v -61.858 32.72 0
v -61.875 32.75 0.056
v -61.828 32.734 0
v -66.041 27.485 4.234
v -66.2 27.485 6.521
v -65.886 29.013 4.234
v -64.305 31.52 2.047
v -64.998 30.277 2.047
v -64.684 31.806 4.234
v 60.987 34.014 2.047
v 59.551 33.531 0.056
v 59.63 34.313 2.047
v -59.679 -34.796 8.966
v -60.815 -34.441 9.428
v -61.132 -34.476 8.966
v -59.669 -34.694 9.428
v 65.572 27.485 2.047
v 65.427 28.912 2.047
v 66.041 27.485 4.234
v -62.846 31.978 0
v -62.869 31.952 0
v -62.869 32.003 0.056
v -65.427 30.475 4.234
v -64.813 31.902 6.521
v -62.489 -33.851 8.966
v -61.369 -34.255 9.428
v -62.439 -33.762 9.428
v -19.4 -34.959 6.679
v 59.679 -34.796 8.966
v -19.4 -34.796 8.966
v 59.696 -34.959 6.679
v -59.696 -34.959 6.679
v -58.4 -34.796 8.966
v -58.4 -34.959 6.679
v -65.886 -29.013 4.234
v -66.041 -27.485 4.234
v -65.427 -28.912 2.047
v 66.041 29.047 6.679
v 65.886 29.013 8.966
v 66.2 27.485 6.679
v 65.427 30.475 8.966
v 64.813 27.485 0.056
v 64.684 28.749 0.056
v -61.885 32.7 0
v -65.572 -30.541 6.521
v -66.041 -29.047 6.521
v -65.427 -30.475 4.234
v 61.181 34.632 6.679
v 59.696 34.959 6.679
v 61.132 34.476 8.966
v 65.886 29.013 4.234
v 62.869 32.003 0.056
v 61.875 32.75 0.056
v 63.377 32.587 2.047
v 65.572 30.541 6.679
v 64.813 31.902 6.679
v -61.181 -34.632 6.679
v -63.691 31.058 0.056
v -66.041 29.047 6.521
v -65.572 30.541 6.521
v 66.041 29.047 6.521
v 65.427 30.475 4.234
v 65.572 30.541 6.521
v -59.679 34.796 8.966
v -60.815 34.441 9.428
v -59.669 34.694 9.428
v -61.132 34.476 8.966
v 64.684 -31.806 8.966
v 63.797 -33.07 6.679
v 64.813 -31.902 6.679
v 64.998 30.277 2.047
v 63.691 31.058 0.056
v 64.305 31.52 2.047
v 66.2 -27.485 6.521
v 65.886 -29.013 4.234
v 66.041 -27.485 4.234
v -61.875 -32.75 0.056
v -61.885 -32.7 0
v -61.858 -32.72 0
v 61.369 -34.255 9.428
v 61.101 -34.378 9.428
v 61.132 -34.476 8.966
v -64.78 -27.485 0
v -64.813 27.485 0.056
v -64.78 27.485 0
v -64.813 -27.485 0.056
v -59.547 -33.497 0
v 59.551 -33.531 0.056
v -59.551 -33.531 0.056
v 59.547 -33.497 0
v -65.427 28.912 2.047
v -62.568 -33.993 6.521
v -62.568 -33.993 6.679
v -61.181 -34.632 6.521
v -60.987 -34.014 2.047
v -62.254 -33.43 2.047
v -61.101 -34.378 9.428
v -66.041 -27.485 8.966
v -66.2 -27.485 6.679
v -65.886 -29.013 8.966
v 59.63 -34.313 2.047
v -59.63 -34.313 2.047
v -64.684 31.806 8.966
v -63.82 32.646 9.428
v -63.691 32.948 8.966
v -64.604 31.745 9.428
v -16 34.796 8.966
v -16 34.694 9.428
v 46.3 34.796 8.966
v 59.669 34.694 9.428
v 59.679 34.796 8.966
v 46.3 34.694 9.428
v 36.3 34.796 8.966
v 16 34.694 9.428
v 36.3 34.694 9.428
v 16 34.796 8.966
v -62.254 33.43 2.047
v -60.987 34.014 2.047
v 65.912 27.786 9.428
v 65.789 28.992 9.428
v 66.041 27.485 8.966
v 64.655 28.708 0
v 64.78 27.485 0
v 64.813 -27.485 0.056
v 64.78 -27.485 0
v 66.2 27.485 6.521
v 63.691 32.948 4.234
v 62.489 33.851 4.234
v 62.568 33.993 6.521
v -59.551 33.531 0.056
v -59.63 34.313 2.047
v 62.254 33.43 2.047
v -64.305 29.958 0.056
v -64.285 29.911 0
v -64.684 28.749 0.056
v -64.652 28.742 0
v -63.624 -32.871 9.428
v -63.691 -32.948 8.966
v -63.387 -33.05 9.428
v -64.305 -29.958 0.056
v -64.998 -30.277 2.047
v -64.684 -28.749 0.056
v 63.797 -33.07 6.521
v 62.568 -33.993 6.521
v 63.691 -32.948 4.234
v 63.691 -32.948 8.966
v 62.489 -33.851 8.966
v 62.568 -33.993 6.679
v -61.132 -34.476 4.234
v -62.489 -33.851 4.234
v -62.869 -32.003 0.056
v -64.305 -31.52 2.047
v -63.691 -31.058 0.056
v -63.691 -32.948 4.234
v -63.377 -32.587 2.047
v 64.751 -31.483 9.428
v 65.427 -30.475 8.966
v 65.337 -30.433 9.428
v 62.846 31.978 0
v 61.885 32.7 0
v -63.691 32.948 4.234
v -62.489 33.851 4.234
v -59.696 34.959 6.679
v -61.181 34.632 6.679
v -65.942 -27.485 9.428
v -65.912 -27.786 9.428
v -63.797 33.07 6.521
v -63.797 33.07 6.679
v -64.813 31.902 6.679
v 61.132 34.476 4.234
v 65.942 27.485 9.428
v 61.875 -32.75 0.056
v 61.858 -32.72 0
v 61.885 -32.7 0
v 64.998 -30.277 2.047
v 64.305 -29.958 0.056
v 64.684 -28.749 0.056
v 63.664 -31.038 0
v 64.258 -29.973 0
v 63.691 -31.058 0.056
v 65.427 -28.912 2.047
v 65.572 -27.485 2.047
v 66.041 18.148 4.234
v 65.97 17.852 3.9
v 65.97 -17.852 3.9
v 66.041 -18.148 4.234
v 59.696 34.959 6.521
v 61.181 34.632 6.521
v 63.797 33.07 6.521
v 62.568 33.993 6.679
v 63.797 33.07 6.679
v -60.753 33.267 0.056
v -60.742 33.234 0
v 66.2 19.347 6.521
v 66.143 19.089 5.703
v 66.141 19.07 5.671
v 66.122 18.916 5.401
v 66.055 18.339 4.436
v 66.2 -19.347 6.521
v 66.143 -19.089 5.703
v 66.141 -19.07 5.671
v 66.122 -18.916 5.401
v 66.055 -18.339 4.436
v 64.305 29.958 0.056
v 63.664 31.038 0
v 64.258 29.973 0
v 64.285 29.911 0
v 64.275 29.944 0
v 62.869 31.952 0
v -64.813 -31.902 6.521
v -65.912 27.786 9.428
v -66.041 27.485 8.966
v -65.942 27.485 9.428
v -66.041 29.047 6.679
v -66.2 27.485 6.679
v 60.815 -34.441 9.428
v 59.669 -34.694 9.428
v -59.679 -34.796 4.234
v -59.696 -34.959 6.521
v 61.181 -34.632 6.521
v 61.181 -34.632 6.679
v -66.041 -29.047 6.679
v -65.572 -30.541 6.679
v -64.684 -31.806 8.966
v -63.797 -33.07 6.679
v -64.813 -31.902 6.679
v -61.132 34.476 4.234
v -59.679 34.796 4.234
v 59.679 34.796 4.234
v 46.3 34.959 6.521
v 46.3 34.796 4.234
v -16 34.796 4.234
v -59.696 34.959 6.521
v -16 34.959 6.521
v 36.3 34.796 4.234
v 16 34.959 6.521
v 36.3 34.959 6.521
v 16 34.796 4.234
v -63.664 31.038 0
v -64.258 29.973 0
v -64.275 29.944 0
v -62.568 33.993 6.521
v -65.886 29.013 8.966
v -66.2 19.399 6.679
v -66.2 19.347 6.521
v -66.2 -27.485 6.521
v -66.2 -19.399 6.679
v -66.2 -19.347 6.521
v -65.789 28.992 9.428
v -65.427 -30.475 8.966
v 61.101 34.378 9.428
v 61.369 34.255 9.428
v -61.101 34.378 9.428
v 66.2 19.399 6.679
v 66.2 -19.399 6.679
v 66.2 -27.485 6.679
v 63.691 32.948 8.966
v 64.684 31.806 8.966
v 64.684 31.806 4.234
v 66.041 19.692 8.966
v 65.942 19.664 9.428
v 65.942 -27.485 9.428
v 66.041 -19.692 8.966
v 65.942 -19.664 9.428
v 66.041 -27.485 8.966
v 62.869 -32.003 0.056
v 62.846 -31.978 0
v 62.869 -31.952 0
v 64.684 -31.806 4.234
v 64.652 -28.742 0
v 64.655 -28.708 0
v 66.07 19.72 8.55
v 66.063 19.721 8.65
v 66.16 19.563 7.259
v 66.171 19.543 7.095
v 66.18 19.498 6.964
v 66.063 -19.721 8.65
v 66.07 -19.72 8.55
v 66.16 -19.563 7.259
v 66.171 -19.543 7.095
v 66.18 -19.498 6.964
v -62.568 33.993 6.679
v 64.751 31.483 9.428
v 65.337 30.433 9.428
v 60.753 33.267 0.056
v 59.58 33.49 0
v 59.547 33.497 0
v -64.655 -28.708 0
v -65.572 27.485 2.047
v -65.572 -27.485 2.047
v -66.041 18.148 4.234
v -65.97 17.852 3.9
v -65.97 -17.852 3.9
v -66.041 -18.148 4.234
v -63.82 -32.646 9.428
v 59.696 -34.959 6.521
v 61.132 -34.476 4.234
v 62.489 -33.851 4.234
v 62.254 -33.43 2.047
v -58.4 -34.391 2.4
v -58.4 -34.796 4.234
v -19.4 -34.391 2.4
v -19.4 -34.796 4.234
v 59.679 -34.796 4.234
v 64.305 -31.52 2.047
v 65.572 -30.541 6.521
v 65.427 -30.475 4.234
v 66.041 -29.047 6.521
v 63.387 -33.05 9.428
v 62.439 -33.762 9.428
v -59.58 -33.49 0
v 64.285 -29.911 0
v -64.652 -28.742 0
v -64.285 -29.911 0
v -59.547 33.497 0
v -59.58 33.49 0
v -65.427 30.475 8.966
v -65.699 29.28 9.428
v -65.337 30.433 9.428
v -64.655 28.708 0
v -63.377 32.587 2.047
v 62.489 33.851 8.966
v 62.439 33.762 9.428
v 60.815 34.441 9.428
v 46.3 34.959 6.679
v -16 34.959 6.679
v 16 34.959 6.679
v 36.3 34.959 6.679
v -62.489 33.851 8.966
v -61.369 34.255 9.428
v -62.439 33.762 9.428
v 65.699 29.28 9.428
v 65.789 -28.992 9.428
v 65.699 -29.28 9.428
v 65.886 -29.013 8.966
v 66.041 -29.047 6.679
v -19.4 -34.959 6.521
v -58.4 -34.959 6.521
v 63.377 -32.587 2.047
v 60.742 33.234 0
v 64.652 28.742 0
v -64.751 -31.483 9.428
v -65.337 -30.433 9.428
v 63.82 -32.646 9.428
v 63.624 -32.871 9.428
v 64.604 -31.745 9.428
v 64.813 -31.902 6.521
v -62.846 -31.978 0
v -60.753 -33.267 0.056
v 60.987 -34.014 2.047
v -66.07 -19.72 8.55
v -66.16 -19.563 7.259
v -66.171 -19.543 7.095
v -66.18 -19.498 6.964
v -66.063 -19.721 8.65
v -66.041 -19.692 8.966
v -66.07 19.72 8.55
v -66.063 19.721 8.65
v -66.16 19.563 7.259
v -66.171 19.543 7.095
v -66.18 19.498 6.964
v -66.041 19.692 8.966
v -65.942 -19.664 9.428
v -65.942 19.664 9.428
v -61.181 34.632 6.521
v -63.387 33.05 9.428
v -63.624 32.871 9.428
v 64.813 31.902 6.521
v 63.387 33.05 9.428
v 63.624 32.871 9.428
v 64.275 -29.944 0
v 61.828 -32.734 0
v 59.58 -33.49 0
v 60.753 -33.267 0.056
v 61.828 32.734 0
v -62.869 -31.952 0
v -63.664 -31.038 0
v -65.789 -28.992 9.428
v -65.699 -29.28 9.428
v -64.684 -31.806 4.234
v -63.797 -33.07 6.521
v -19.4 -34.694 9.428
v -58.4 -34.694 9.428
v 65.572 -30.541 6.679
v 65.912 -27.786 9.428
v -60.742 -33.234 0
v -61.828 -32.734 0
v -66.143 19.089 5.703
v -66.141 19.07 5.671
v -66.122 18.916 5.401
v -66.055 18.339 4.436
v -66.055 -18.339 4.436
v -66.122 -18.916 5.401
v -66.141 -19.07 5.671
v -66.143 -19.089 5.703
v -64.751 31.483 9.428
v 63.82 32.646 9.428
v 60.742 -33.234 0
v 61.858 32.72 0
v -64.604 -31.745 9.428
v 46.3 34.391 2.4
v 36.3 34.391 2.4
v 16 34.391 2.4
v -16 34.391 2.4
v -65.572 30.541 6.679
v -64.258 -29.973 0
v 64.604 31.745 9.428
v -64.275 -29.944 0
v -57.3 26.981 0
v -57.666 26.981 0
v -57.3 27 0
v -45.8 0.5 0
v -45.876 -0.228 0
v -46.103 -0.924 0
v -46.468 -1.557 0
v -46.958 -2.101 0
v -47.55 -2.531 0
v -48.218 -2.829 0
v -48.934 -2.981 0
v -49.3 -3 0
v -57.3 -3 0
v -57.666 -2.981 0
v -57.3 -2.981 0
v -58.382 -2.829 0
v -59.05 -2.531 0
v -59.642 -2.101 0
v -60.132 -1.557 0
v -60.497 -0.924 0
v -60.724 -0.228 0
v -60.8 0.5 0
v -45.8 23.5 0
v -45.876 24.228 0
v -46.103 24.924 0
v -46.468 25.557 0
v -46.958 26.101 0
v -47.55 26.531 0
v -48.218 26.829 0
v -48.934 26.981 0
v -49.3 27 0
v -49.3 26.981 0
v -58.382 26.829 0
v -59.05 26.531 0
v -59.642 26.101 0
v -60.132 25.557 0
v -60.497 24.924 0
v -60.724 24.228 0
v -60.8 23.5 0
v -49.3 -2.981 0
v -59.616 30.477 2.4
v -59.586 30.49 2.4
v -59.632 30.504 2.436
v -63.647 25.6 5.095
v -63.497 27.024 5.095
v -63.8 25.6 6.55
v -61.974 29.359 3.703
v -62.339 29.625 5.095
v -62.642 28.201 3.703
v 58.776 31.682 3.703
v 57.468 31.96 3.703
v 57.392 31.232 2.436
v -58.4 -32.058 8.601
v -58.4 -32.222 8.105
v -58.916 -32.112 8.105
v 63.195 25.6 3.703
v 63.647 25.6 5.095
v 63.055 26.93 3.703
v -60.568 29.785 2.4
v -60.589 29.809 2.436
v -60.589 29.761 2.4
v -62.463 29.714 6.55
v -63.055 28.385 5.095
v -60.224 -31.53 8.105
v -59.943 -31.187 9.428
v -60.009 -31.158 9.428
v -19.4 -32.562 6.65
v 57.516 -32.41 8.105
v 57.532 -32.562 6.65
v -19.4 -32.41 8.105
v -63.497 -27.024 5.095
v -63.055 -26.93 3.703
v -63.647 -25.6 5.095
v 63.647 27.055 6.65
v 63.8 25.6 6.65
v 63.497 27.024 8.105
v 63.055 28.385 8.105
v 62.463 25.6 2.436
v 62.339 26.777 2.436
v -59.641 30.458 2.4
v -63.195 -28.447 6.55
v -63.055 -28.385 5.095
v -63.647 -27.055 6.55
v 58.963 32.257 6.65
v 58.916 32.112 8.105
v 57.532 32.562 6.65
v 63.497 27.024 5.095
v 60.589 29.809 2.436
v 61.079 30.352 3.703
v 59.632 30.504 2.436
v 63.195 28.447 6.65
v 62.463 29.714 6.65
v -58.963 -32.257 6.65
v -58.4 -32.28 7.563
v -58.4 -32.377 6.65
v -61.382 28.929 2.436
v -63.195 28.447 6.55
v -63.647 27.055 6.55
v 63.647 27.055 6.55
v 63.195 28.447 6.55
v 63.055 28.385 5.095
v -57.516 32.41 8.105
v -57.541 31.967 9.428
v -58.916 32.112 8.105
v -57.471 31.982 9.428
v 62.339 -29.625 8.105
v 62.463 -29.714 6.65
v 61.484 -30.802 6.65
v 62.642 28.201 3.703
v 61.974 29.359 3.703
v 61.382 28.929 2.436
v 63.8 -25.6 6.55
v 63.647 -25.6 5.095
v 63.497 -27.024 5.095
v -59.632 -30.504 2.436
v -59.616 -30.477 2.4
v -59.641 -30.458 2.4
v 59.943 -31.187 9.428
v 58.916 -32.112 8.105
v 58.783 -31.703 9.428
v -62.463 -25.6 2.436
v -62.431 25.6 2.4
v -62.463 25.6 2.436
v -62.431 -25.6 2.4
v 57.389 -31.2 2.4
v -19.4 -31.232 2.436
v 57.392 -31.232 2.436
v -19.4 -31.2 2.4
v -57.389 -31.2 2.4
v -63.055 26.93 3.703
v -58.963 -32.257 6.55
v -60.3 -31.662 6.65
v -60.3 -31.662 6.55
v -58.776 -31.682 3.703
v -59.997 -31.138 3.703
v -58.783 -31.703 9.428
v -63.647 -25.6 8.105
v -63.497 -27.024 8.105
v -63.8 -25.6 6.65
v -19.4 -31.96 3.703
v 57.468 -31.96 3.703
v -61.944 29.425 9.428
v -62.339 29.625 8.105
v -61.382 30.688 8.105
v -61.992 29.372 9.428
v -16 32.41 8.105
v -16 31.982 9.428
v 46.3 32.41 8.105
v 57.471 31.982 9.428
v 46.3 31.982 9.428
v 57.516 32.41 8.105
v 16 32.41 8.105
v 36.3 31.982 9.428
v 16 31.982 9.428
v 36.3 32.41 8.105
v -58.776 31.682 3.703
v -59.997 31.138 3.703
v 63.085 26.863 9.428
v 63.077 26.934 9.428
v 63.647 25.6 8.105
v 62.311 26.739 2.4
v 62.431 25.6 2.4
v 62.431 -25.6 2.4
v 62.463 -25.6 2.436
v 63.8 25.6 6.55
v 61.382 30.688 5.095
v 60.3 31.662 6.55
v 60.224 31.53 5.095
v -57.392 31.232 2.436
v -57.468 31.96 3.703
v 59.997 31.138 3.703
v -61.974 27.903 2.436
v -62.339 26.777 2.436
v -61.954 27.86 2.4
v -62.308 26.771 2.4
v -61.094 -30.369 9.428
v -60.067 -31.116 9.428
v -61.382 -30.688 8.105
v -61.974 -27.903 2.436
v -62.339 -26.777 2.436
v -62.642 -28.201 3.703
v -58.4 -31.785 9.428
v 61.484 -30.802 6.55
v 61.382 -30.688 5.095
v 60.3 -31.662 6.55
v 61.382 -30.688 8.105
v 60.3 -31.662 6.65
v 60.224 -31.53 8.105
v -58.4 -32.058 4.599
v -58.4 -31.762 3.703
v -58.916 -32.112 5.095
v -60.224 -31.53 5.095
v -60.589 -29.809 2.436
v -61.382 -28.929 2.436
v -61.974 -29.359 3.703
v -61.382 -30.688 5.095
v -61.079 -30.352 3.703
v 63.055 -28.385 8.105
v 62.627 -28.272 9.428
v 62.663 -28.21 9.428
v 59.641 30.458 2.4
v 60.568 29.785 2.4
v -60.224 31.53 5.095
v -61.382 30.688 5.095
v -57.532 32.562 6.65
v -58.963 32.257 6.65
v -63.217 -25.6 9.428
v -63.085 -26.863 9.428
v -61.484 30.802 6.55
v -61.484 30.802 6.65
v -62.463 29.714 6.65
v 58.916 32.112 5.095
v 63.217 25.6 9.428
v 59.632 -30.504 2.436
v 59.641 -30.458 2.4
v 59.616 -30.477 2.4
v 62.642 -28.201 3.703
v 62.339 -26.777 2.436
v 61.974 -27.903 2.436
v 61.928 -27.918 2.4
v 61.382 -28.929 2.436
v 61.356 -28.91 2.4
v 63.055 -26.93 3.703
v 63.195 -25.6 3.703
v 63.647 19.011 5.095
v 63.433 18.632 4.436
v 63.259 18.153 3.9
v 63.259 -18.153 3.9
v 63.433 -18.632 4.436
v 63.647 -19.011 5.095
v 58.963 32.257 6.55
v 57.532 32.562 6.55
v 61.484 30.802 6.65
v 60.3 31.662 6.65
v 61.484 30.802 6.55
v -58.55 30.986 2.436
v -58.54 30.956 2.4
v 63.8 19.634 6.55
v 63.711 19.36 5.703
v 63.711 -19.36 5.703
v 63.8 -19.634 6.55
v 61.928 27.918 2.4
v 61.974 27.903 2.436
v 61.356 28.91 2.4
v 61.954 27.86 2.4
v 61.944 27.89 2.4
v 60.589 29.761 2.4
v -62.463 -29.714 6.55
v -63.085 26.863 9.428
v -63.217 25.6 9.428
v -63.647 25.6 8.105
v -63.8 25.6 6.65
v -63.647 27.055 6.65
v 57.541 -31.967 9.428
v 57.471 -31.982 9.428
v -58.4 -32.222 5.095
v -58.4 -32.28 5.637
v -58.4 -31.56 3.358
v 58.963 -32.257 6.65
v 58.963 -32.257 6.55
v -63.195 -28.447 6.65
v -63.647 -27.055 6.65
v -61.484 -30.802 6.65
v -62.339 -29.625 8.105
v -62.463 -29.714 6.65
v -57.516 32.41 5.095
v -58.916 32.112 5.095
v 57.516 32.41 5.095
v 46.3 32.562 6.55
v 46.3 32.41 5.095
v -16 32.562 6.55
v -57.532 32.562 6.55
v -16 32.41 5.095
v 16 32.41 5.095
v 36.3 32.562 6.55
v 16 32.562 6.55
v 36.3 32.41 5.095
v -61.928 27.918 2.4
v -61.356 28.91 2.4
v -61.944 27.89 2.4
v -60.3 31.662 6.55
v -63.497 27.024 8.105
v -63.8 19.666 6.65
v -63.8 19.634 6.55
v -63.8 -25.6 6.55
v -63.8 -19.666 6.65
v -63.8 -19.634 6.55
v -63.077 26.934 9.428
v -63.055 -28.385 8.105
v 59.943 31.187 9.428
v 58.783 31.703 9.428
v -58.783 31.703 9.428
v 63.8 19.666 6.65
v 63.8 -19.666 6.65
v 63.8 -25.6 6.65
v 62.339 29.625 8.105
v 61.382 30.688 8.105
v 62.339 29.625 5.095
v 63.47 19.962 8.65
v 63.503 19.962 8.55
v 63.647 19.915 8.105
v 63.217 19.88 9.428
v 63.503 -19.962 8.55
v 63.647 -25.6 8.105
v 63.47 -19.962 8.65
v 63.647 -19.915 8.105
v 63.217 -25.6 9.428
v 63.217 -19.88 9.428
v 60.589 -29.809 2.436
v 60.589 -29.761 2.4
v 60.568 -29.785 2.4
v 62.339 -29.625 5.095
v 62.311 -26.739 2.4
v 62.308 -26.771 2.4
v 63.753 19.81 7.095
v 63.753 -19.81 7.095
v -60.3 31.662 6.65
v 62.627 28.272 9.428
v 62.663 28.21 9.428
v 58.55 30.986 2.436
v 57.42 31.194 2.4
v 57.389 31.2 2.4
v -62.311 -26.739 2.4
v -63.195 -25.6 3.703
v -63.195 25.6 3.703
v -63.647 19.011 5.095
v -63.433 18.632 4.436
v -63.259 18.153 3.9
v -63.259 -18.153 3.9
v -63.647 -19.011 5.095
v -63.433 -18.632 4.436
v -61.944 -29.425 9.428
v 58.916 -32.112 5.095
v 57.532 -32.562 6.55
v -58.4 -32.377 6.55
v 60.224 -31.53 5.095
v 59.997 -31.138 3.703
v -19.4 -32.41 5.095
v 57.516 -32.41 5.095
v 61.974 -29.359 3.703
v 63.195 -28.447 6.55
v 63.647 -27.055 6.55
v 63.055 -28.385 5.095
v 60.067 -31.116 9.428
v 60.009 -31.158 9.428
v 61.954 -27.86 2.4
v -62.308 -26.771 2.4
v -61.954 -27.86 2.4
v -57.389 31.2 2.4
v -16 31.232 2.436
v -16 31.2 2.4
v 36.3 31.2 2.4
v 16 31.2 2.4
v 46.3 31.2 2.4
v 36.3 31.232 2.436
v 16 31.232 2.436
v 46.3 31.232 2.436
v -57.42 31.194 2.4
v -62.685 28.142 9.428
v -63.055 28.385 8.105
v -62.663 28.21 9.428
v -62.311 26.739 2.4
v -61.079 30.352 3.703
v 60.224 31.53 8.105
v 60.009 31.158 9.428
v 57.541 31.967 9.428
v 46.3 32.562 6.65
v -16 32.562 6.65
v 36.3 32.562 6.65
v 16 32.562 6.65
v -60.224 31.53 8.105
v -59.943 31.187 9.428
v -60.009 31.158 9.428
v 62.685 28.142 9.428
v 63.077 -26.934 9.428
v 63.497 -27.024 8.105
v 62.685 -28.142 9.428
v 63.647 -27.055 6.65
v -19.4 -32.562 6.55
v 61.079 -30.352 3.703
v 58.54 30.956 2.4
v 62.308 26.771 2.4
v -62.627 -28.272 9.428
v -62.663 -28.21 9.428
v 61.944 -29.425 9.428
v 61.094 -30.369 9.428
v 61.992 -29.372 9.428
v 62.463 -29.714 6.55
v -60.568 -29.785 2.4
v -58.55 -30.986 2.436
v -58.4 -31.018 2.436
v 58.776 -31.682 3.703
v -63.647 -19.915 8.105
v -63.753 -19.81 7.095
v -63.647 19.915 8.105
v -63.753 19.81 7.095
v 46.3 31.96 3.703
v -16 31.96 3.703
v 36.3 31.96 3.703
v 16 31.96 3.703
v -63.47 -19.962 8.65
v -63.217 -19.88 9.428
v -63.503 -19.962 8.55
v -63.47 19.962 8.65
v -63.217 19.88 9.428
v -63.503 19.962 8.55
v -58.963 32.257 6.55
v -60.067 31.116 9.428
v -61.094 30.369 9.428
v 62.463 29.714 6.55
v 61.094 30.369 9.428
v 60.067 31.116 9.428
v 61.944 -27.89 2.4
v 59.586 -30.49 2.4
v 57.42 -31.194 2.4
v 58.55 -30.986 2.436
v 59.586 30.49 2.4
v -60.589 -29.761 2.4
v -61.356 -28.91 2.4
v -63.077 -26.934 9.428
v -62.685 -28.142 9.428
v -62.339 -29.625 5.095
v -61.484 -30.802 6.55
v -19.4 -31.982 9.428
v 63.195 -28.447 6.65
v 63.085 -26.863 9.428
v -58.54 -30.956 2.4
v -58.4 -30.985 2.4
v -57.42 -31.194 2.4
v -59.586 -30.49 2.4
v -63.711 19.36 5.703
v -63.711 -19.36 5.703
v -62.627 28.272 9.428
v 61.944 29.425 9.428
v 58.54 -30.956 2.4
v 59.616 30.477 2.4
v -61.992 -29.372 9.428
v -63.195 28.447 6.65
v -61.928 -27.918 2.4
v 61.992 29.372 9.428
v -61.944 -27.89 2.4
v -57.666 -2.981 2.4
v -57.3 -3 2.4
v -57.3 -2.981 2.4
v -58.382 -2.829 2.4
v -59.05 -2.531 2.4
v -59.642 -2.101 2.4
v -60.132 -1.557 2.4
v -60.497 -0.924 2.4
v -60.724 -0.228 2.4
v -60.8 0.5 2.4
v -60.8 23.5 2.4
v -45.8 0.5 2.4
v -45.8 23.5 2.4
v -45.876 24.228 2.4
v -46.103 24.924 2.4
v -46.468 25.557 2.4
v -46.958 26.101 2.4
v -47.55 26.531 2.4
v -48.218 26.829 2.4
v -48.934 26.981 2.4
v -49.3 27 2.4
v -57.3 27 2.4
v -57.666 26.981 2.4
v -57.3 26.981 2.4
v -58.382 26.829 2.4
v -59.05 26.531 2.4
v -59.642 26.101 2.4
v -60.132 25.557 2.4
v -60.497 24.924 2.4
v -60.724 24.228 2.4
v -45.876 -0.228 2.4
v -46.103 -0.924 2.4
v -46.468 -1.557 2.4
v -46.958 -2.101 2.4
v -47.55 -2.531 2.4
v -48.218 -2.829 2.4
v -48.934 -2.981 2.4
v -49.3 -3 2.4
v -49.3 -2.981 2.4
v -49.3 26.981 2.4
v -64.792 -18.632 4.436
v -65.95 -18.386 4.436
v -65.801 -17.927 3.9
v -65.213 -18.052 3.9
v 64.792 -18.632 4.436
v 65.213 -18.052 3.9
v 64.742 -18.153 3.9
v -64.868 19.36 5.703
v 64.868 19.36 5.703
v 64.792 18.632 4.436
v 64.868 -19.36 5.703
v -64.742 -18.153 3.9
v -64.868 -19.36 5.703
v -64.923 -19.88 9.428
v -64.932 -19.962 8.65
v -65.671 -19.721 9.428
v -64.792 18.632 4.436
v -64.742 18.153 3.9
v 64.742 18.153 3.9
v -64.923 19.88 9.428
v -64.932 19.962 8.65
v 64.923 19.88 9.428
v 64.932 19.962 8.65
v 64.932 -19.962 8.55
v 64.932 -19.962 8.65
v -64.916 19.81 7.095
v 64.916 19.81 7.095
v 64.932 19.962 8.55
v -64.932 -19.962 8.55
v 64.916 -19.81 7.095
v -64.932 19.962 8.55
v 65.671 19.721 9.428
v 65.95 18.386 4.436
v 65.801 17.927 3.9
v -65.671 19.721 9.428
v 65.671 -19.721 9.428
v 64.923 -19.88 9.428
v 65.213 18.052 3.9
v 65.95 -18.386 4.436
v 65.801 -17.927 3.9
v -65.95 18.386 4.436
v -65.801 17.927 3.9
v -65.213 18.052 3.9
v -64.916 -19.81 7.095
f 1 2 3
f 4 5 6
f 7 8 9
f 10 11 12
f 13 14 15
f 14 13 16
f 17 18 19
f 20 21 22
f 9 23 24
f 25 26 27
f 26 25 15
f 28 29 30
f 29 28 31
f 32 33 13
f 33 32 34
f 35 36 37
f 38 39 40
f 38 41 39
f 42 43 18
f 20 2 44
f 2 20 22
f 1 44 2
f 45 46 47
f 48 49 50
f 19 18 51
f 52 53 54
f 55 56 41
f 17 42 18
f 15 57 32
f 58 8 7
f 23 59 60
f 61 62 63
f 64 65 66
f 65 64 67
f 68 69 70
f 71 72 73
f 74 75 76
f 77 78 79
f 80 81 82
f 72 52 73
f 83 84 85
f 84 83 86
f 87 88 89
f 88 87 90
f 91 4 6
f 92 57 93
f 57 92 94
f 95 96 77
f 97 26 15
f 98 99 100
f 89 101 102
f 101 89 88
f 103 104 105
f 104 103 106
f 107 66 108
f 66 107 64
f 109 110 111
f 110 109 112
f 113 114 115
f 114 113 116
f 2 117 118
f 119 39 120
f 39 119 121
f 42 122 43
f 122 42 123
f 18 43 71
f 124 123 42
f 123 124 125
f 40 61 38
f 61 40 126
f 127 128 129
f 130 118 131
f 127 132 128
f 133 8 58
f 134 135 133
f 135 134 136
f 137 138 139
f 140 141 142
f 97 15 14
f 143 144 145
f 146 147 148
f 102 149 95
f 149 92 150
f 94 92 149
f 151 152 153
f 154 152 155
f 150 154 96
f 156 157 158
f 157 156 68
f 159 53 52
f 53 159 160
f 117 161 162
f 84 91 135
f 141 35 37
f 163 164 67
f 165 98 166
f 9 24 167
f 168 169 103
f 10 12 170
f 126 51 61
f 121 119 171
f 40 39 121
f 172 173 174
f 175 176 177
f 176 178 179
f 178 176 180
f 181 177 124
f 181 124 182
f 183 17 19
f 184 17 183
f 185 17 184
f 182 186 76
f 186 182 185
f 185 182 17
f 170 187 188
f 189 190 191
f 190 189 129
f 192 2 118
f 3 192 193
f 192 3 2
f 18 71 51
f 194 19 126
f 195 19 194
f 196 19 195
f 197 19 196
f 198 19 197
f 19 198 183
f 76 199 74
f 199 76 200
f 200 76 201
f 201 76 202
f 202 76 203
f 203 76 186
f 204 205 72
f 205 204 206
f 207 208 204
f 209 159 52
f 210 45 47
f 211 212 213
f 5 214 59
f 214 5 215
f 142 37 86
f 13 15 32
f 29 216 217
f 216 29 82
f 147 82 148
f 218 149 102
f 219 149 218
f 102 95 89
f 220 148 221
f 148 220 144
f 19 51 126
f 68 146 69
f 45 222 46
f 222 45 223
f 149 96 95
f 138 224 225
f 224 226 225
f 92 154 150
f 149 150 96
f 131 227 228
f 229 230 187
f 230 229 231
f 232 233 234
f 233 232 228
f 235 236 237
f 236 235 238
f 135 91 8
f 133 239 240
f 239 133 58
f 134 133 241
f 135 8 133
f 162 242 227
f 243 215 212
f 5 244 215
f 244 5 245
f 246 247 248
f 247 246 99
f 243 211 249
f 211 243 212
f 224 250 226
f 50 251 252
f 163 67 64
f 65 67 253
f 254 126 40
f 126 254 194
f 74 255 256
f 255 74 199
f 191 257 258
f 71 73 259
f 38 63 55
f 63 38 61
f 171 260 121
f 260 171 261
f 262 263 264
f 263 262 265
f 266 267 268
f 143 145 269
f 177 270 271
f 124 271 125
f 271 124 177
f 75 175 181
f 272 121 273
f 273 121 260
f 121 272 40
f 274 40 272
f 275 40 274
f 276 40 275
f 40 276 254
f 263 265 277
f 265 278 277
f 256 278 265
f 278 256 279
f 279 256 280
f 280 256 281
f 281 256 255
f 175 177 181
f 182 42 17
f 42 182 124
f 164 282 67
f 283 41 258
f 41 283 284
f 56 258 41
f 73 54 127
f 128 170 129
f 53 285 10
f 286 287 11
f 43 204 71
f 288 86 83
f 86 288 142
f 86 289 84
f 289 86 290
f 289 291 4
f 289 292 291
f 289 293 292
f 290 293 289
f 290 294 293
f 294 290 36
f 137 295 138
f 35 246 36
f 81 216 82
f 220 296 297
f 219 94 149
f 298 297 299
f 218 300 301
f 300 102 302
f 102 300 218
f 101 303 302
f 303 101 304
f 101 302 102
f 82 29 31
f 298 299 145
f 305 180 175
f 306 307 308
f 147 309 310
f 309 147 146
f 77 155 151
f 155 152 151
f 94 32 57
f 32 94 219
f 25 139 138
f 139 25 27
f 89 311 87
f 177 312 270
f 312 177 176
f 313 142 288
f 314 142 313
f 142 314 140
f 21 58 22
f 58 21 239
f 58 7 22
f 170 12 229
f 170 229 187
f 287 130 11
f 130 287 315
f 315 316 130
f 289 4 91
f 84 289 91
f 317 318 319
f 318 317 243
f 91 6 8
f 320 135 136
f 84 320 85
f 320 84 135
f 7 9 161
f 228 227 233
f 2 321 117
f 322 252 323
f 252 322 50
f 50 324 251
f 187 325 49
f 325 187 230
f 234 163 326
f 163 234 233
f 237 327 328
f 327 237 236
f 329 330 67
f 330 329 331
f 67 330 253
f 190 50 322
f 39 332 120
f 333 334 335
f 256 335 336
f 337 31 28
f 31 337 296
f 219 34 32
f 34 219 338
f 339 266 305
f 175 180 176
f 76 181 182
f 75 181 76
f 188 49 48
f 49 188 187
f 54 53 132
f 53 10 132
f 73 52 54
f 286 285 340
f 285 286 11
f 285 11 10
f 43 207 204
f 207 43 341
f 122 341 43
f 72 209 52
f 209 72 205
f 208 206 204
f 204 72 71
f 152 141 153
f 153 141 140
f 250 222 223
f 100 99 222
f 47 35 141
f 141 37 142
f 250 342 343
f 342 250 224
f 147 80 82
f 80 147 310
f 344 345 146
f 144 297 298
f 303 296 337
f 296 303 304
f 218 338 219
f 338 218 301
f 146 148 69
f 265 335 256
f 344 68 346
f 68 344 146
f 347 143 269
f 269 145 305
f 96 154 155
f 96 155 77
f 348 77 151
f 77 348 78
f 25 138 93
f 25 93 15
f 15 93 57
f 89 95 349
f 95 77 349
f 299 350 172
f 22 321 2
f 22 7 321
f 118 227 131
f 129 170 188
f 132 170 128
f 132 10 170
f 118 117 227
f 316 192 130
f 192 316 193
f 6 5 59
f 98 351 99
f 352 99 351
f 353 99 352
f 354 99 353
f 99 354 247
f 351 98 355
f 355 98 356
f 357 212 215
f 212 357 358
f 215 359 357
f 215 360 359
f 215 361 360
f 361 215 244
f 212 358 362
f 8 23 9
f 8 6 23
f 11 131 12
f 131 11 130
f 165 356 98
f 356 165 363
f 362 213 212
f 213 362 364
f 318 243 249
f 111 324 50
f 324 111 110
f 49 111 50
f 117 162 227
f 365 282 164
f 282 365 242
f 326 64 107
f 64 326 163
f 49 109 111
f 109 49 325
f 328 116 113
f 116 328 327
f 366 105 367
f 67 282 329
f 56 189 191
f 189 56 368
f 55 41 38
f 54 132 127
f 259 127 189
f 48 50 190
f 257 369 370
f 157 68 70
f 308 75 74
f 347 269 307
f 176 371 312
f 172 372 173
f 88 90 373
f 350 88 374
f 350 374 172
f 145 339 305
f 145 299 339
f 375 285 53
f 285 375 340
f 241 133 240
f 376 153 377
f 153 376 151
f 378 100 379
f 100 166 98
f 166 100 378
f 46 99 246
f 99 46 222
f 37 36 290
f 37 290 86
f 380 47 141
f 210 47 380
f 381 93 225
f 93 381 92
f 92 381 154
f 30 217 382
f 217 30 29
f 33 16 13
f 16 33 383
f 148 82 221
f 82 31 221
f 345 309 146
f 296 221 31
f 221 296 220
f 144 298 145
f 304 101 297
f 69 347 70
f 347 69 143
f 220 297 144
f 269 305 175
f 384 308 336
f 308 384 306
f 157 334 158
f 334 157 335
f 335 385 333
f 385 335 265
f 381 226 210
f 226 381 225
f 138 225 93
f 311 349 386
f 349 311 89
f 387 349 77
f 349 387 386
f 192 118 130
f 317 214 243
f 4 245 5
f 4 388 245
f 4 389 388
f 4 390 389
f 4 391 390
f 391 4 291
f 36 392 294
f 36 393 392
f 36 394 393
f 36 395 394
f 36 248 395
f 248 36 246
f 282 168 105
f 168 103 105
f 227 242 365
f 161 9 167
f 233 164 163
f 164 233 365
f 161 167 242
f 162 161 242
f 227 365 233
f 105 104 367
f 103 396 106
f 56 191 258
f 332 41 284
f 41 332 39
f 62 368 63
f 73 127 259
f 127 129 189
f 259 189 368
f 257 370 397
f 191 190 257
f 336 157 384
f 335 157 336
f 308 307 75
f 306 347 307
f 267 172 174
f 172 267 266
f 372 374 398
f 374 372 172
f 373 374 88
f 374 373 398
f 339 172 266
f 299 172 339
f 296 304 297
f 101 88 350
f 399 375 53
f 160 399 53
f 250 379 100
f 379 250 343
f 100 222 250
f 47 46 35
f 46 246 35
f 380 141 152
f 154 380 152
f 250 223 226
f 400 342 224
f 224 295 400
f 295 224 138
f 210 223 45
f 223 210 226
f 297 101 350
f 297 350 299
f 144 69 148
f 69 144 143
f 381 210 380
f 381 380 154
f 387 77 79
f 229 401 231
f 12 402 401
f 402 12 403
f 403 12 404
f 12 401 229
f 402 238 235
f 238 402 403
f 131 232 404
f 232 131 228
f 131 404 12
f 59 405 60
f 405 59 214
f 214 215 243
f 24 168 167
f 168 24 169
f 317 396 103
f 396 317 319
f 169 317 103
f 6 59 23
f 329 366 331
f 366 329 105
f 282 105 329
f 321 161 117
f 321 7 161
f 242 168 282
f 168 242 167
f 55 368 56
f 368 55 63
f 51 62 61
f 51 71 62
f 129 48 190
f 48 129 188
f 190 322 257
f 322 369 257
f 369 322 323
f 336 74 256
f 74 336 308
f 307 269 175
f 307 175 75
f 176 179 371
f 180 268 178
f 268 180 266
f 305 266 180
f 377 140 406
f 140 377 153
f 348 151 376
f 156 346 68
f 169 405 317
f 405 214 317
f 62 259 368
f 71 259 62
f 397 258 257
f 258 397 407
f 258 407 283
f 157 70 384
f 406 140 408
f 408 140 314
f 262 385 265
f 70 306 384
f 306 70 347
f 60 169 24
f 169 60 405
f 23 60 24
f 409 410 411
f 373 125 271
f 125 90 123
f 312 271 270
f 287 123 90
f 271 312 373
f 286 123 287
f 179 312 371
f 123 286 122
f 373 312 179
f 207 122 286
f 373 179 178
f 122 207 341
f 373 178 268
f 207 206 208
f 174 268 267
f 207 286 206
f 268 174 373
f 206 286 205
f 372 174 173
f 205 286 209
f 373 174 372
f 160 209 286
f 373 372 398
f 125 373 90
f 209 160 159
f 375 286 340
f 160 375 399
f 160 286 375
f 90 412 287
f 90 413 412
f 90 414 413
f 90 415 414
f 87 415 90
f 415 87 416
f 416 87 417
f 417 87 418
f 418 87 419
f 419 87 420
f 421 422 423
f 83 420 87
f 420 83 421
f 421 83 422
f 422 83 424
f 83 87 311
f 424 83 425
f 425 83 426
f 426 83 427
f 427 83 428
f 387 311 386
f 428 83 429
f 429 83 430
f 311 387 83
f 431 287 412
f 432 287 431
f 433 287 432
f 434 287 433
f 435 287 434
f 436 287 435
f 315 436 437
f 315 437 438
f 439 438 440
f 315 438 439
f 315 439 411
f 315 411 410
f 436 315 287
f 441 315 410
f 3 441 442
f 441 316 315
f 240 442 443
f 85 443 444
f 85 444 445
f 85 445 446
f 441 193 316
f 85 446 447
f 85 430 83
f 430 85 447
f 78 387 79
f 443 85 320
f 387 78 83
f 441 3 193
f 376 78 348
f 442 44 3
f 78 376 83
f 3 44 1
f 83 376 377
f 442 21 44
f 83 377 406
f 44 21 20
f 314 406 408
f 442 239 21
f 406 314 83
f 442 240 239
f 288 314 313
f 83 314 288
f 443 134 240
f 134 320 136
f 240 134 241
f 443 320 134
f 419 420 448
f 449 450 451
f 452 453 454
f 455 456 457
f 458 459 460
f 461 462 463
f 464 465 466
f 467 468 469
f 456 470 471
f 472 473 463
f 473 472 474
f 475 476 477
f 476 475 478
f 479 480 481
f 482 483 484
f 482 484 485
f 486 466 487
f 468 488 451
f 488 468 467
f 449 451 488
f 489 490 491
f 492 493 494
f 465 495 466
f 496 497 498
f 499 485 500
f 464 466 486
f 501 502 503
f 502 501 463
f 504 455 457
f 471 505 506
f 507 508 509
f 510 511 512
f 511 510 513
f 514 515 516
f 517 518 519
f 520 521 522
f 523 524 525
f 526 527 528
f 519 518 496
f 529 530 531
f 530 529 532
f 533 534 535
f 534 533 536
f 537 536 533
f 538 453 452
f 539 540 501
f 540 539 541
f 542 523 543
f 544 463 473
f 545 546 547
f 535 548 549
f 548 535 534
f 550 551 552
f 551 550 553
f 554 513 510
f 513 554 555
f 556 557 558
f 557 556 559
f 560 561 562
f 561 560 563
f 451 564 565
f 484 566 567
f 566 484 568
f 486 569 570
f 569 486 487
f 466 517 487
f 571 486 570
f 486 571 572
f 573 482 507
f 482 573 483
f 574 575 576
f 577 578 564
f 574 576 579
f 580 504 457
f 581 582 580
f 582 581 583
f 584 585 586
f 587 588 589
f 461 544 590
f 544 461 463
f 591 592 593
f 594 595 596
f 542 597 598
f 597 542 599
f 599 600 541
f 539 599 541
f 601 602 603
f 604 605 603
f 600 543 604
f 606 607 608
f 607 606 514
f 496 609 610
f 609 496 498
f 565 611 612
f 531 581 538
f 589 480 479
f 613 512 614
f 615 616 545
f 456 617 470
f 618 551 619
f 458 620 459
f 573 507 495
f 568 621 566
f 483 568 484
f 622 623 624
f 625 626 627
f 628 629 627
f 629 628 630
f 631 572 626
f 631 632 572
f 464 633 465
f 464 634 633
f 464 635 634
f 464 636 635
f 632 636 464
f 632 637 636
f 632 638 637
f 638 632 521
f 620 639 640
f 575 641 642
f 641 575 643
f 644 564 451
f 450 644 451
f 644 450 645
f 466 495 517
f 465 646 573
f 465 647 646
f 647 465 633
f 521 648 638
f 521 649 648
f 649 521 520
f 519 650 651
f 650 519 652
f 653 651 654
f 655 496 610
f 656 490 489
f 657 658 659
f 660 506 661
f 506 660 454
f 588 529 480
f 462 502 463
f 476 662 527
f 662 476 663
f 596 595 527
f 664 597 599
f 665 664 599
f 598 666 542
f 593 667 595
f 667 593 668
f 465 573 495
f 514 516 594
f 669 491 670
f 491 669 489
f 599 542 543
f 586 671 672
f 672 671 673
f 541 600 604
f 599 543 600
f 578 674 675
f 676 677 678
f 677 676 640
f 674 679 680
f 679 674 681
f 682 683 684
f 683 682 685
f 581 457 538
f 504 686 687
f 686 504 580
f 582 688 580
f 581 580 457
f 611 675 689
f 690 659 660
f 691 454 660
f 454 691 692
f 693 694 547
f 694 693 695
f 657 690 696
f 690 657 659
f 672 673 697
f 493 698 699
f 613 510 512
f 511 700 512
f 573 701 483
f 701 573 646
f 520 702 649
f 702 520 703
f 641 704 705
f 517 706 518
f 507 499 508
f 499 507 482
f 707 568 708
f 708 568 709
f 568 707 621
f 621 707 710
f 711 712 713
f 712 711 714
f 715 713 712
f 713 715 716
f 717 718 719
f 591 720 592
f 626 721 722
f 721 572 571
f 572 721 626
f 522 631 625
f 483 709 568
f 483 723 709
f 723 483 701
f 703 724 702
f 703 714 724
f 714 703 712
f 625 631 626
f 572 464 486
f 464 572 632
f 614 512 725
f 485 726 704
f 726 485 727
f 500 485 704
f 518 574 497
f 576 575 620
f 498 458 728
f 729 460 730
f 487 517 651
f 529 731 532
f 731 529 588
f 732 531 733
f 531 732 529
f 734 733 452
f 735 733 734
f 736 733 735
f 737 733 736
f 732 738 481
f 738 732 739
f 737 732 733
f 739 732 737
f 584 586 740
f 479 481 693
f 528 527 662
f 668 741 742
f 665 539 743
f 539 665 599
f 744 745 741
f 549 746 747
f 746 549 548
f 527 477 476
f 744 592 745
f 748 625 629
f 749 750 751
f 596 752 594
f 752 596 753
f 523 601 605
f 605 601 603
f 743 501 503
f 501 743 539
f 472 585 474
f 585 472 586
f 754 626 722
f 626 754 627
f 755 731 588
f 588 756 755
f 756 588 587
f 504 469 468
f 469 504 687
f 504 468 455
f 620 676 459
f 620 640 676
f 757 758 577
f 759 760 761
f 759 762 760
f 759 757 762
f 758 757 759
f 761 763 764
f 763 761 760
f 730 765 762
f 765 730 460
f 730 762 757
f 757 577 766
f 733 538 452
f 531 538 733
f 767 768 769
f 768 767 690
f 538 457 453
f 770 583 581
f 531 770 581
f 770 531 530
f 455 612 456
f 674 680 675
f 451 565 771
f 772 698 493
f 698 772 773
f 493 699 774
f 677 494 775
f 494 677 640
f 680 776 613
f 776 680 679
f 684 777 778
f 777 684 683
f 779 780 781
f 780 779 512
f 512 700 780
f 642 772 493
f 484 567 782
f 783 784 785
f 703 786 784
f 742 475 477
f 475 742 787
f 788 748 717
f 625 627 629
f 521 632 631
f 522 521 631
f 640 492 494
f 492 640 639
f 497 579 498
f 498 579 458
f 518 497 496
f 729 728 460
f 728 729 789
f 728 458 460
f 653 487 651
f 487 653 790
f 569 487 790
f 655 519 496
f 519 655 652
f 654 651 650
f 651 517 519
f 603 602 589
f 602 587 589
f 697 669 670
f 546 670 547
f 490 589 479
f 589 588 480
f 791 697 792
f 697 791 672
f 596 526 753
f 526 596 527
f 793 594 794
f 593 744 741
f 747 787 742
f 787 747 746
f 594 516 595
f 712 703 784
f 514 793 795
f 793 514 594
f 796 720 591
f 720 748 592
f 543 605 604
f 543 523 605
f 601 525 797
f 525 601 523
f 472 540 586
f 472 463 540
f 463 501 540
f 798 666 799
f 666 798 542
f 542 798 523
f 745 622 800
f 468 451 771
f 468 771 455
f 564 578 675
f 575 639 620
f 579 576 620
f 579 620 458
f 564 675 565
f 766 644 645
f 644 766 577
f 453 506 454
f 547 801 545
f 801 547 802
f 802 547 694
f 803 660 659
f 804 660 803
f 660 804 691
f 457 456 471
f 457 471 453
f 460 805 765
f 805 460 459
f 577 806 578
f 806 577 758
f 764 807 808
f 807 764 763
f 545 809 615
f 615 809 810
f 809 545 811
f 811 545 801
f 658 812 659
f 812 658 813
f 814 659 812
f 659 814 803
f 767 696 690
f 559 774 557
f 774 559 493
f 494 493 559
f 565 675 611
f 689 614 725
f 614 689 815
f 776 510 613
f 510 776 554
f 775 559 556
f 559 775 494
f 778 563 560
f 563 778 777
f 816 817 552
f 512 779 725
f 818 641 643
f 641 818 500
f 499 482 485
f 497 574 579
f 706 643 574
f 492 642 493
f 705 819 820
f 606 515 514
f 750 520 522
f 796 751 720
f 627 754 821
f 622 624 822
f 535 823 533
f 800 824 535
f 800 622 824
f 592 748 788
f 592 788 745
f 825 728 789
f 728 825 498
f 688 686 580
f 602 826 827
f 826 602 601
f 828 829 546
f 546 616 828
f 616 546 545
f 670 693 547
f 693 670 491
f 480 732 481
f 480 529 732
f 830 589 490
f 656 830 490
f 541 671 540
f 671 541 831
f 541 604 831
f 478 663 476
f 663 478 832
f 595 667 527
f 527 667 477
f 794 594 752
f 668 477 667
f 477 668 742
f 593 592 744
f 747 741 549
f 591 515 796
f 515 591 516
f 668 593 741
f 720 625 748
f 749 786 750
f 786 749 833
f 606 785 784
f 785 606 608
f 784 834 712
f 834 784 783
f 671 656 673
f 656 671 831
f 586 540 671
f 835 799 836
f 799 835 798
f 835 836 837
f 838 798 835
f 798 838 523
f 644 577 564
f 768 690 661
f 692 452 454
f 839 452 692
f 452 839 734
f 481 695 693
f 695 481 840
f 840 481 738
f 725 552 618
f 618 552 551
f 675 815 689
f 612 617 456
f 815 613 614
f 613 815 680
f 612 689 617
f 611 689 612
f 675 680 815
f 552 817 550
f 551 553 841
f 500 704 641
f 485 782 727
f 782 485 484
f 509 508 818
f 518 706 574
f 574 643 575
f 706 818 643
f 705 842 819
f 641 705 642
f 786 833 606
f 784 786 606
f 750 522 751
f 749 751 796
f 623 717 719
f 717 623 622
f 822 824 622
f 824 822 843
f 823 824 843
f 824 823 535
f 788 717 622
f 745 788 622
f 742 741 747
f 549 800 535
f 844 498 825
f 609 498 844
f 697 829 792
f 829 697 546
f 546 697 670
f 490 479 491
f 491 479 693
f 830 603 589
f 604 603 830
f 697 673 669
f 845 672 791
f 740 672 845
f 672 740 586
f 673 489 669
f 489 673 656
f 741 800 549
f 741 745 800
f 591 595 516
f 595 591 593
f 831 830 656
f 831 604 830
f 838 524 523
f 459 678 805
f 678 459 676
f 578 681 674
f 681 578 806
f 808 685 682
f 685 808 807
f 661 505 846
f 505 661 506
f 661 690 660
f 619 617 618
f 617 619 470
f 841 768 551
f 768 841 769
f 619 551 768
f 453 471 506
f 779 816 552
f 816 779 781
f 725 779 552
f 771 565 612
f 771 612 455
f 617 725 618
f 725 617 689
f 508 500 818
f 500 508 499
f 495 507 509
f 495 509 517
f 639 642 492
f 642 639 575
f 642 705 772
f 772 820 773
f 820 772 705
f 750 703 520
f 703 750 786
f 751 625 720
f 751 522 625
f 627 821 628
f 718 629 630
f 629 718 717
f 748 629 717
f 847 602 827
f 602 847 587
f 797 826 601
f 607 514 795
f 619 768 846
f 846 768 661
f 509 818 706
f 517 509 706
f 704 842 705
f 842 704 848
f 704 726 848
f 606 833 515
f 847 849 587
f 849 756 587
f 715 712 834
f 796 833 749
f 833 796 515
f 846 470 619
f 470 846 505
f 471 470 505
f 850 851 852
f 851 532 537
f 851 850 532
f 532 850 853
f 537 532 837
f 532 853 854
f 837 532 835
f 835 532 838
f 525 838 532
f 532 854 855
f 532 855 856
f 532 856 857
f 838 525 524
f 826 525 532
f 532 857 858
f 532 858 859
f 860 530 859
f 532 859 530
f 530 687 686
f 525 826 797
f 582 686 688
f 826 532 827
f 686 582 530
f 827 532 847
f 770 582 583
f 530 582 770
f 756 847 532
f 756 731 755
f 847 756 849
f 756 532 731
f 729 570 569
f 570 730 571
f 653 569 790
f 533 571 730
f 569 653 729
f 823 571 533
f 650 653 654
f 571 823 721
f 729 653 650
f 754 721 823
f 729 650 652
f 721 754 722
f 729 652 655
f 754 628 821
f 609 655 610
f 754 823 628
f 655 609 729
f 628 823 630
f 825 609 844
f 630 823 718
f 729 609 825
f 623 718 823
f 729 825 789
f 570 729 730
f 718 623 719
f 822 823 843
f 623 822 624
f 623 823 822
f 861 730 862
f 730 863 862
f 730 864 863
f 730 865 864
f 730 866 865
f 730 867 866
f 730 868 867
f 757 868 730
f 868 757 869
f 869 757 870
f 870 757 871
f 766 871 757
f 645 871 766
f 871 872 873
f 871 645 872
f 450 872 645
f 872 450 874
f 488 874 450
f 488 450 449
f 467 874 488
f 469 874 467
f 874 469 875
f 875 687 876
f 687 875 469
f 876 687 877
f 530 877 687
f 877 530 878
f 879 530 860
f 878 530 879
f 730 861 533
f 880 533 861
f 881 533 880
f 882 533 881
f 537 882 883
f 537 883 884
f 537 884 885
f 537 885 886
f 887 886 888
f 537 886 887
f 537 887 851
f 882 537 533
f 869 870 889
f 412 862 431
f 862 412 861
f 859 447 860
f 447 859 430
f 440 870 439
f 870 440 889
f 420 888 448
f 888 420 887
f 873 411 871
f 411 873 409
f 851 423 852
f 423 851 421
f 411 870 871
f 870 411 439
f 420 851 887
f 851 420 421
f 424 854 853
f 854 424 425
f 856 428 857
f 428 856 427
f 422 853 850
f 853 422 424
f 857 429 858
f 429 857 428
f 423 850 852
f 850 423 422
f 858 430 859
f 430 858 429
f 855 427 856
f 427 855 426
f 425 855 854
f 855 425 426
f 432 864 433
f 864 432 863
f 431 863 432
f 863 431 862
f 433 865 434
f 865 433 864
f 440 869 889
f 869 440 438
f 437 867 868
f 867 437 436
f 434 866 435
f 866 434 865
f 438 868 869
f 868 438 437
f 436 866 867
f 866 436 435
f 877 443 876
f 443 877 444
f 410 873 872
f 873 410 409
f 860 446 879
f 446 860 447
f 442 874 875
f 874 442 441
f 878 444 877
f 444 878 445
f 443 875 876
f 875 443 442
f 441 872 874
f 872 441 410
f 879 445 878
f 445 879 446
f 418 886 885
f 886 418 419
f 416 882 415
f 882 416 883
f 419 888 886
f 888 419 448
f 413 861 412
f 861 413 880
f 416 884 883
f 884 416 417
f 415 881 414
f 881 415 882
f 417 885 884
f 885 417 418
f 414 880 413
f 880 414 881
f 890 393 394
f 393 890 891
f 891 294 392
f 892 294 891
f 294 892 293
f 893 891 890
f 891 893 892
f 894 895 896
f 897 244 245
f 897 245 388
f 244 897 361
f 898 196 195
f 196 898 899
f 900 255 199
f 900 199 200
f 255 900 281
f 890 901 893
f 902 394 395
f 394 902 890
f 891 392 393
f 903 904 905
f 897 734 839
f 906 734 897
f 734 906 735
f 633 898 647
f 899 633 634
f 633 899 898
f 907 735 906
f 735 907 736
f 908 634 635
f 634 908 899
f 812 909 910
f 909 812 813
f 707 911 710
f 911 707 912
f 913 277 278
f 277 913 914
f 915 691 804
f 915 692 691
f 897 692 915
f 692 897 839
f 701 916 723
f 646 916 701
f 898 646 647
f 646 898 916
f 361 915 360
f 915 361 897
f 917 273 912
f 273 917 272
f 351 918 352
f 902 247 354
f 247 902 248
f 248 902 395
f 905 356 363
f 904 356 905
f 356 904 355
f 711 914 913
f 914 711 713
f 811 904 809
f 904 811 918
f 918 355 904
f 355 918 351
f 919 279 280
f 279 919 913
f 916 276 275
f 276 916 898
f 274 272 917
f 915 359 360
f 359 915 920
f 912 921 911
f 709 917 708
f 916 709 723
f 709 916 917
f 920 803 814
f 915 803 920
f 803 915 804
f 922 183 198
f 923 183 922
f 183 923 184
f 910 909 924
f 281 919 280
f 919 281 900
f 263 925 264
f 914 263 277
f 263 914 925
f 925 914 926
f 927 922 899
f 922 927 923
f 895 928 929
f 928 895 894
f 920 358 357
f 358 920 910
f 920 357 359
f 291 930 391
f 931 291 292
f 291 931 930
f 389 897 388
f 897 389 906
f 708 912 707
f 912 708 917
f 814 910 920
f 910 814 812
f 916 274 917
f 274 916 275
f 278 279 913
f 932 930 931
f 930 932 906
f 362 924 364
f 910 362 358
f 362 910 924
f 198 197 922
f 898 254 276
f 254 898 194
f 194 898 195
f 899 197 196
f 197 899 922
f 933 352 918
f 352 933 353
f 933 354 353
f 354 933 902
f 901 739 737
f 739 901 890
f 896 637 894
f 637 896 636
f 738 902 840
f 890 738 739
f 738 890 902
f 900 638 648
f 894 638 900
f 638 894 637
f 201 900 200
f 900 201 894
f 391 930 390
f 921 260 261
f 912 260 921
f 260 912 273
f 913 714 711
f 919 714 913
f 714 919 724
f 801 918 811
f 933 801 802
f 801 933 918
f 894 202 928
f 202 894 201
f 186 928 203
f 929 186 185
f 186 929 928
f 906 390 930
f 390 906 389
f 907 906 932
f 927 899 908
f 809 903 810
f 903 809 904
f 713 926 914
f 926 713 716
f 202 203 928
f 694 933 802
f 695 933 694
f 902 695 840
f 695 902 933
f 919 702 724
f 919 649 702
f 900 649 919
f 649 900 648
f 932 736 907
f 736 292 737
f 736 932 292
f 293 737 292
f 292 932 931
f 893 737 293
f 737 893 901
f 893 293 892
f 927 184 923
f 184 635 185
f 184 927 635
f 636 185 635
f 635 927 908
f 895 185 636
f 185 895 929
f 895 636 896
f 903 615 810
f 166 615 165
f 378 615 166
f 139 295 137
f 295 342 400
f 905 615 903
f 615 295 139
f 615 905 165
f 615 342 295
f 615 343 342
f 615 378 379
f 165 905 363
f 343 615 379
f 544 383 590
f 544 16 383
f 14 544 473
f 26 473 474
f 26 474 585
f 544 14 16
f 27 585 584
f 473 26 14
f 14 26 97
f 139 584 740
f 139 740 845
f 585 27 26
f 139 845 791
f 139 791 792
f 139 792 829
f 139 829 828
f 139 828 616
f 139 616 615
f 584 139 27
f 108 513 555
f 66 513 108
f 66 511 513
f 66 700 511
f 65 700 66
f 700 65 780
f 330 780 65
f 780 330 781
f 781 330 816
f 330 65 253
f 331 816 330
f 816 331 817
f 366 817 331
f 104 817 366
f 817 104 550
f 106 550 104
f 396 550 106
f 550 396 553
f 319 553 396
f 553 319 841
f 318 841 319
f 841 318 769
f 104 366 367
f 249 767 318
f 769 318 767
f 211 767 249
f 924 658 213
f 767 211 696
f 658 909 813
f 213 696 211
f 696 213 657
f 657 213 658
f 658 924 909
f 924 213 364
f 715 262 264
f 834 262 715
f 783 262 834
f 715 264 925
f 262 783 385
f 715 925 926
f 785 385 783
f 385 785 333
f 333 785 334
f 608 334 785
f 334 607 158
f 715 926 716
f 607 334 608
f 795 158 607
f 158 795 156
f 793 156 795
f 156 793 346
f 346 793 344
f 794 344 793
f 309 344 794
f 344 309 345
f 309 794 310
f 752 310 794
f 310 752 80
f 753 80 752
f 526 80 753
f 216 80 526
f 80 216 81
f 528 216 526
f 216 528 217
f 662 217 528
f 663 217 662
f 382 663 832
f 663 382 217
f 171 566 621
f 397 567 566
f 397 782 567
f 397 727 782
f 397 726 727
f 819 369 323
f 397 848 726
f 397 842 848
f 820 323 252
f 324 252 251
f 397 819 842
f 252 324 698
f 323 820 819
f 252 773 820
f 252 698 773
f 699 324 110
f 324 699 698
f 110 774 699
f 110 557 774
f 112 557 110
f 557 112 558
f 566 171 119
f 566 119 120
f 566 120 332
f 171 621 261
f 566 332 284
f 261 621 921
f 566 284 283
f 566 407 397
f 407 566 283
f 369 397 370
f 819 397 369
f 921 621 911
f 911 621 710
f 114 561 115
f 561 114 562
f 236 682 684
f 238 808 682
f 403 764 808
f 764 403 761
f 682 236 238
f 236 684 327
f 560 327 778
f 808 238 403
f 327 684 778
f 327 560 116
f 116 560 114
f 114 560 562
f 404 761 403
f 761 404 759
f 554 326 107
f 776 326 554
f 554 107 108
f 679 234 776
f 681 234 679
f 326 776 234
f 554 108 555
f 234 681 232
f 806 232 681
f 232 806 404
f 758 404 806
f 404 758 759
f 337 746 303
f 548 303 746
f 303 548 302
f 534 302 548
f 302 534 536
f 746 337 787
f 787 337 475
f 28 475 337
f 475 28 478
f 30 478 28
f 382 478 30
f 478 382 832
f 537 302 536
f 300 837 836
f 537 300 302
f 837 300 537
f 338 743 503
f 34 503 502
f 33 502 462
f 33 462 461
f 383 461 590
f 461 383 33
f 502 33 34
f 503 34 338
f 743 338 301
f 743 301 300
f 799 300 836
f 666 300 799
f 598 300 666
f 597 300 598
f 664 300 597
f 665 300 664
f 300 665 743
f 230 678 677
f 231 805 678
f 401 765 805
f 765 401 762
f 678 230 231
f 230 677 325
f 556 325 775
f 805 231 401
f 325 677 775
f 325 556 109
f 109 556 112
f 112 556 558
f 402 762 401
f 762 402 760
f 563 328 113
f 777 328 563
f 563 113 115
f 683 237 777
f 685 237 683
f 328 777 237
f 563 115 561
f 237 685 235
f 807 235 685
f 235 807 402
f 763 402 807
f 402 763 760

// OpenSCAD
$fn = 30;

// set this to some multiple of your nozzle width
shellWidth = 2.4;
wallWidth = shellWidth;

// actual dimensions
//length = 127;
//width = 64.9;
//depth = 8.4;

// tweaked larger a bit
length = 127.6;
width = 65.2;
depth = 8.4;

// we're trying to make it as big as the phone plus a wall all around
xscale = (length+2*wallWidth)/length;
yscale = (width+2*wallWidth)/width;
zscale = (depth+2*wallWidth)/depth;

// I'm really not sure about these. I tried to measure it with calipers and
// work it out, but it is tricky.
cornerRadius = 3.5;
edgeRadius = 7;

// how much to leave on the bottom around the edges. Trying to go as strong as
// possible without overlapping the camera lens.
edge = 7;

// how much to leave at the top and bottom corners
corner = 15;

// how much to leave above and below the cutouts
lip = 1.5;

// just for convenience
outsideLength = length*xscale;
outsideWidth = width*yscale;
outsideDepth = depth*zscale;

// bottom / base stuff
bottomCutoutLength = length - edge*2;
bottomCutoutWidth = width - edge*2;

// the cutouts at the top and bottom where the headphone jack and microphones
// are. Too many little things, so just make it symmetrical
vLength = length*xscale + 10;
vWidth = width*yscale - 2*corner;
vHeight = (outsideDepth - (lip+wallWidth))+0.1;

// power+volume buttons
pLength = 32;
pWidth = edgeRadius*2+1;
//pHeight = vHeight;
pHeight = depth*zscale - (lip+wallWidth)*2;

// camera button
cOffset = 17.5 + wallWidth; // still not 100%
cLength = 10;
cWidth = edgeRadius*2+1;
cHeight = depth*zscale - (lip+wallWidth)*2;

// charger flap
chLength = 39;
chWidth = edgeRadius*2+1;
chHeight = depth*zscale - (lip+wallWidth)*2;


// a three dimensional rounded rectangle
module rounded(l, w, d, r) {
  // i for inner
  il = l - 2*r;
  iw = w - 2*r;

  union() {
    translate([r, r, 0]) {
      translate([-r, 0, 0])
      cube([l, iw, d]);

      translate([0, -r, 0])
      cube([il, w, d]);

      cylinder(h=d, r=r);

      translate([il, iw, 0])
      cylinder(h=d, r=r);

      translate([0, iw, 0])
      cylinder(h=d, r=r);

      translate([il, 0, 0])
      cylinder(h=d, r=r);
    }
  }
}

module roundedSlab(l, w, d, e) {
  // This routine is a bit fiddly. l and w each have to be bigger than e*2 and
  // I think d has to be smaller.
  up = (e*2+0.1)/2 - d/2;
  translate([0, 0, -up])
  intersection() {
    translate([e, e, e])
    minkowski() {
      cube([l-e*2, w-e*2, 0.1]);
      sphere(e);
    }
    // cut just the phone part out
    translate([0, 0, up])
    cube([l, w, d]);
  }
}

module phone() {
  roundedSlab(l=length, w=width, d=depth, e=edgeRadius);
}

module bottomCutout() {
  translate([wallWidth+3, edge+25, -0.1])
  rounded(
    l=15,
    w=30,
    d=wallWidth+1,
    r=cornerRadius);
}

module topCutout() {
  tLength = length*xscale+2*wallWidth;
  tWidth = width*yscale+2*wallWidth;
  translate([0, 0, (depth-wallWidth)*zscale-0.001])
  cube([tLength, tWidth, 10]);
}

module verticalCutout() {
  translate([-5, corner, wallWidth + lip])
  roundedSlab(l=vLength, w=vWidth, d=vHeight, e=edgeRadius);
}

module powerCutout() {
  translate([outsideLength/2 - pLength/2, outsideWidth - pWidth/2, wallWidth])
  cube([pLength, pWidth, pHeight+5]);
  //roundedSlab(l=pLength, w=pWidth, d=pHeight, e=edgeRadius);
}

module chargerCutout() {
  translate([wallWidth*2+3, 0, wallWidth])
  cube([chLength, chWidth, pHeight+5]);
}

module cameraCutout() {
  translate([outsideLength - (cOffset+cLength), outsideWidth - cWidth/2, wallWidth])
  cube([cLength, cWidth, cHeight+5]);
}

module cover() {
  difference() {
    // make the outer shell
    scale([xscale, yscale, zscale])
    phone();

    // cut out the inside
    translate([wallWidth, wallWidth, wallWidth])
    phone();

    // cut out the back side
    bottomCutout();

    // cut off the part above the screen
    topCutout();

    // cut out the vertical top+bottom
    verticalCutout();

    // cut out the power and volume buttons
    powerCutout();

    // cut out the power charger flap
    chargerCutout();

    // cut out the camera button
    cameraCutout();

    // cut out the left+right
    /*
    // (this was from when I wanted to do the same as for top+bottom)
    hLength = length*xscale - 2*corner;
    hWidth = width*yscale + 10;
    hHeight = depth*zscale + 1;
    translate([corner, 0, wallWidth + lip])
    cube([hLength, hWidth, hHeight]);
    */
  }
}

translate([-length*xscale/2, -width*yscale/2, 0])
cover();
//phone();
//powerCutout();
